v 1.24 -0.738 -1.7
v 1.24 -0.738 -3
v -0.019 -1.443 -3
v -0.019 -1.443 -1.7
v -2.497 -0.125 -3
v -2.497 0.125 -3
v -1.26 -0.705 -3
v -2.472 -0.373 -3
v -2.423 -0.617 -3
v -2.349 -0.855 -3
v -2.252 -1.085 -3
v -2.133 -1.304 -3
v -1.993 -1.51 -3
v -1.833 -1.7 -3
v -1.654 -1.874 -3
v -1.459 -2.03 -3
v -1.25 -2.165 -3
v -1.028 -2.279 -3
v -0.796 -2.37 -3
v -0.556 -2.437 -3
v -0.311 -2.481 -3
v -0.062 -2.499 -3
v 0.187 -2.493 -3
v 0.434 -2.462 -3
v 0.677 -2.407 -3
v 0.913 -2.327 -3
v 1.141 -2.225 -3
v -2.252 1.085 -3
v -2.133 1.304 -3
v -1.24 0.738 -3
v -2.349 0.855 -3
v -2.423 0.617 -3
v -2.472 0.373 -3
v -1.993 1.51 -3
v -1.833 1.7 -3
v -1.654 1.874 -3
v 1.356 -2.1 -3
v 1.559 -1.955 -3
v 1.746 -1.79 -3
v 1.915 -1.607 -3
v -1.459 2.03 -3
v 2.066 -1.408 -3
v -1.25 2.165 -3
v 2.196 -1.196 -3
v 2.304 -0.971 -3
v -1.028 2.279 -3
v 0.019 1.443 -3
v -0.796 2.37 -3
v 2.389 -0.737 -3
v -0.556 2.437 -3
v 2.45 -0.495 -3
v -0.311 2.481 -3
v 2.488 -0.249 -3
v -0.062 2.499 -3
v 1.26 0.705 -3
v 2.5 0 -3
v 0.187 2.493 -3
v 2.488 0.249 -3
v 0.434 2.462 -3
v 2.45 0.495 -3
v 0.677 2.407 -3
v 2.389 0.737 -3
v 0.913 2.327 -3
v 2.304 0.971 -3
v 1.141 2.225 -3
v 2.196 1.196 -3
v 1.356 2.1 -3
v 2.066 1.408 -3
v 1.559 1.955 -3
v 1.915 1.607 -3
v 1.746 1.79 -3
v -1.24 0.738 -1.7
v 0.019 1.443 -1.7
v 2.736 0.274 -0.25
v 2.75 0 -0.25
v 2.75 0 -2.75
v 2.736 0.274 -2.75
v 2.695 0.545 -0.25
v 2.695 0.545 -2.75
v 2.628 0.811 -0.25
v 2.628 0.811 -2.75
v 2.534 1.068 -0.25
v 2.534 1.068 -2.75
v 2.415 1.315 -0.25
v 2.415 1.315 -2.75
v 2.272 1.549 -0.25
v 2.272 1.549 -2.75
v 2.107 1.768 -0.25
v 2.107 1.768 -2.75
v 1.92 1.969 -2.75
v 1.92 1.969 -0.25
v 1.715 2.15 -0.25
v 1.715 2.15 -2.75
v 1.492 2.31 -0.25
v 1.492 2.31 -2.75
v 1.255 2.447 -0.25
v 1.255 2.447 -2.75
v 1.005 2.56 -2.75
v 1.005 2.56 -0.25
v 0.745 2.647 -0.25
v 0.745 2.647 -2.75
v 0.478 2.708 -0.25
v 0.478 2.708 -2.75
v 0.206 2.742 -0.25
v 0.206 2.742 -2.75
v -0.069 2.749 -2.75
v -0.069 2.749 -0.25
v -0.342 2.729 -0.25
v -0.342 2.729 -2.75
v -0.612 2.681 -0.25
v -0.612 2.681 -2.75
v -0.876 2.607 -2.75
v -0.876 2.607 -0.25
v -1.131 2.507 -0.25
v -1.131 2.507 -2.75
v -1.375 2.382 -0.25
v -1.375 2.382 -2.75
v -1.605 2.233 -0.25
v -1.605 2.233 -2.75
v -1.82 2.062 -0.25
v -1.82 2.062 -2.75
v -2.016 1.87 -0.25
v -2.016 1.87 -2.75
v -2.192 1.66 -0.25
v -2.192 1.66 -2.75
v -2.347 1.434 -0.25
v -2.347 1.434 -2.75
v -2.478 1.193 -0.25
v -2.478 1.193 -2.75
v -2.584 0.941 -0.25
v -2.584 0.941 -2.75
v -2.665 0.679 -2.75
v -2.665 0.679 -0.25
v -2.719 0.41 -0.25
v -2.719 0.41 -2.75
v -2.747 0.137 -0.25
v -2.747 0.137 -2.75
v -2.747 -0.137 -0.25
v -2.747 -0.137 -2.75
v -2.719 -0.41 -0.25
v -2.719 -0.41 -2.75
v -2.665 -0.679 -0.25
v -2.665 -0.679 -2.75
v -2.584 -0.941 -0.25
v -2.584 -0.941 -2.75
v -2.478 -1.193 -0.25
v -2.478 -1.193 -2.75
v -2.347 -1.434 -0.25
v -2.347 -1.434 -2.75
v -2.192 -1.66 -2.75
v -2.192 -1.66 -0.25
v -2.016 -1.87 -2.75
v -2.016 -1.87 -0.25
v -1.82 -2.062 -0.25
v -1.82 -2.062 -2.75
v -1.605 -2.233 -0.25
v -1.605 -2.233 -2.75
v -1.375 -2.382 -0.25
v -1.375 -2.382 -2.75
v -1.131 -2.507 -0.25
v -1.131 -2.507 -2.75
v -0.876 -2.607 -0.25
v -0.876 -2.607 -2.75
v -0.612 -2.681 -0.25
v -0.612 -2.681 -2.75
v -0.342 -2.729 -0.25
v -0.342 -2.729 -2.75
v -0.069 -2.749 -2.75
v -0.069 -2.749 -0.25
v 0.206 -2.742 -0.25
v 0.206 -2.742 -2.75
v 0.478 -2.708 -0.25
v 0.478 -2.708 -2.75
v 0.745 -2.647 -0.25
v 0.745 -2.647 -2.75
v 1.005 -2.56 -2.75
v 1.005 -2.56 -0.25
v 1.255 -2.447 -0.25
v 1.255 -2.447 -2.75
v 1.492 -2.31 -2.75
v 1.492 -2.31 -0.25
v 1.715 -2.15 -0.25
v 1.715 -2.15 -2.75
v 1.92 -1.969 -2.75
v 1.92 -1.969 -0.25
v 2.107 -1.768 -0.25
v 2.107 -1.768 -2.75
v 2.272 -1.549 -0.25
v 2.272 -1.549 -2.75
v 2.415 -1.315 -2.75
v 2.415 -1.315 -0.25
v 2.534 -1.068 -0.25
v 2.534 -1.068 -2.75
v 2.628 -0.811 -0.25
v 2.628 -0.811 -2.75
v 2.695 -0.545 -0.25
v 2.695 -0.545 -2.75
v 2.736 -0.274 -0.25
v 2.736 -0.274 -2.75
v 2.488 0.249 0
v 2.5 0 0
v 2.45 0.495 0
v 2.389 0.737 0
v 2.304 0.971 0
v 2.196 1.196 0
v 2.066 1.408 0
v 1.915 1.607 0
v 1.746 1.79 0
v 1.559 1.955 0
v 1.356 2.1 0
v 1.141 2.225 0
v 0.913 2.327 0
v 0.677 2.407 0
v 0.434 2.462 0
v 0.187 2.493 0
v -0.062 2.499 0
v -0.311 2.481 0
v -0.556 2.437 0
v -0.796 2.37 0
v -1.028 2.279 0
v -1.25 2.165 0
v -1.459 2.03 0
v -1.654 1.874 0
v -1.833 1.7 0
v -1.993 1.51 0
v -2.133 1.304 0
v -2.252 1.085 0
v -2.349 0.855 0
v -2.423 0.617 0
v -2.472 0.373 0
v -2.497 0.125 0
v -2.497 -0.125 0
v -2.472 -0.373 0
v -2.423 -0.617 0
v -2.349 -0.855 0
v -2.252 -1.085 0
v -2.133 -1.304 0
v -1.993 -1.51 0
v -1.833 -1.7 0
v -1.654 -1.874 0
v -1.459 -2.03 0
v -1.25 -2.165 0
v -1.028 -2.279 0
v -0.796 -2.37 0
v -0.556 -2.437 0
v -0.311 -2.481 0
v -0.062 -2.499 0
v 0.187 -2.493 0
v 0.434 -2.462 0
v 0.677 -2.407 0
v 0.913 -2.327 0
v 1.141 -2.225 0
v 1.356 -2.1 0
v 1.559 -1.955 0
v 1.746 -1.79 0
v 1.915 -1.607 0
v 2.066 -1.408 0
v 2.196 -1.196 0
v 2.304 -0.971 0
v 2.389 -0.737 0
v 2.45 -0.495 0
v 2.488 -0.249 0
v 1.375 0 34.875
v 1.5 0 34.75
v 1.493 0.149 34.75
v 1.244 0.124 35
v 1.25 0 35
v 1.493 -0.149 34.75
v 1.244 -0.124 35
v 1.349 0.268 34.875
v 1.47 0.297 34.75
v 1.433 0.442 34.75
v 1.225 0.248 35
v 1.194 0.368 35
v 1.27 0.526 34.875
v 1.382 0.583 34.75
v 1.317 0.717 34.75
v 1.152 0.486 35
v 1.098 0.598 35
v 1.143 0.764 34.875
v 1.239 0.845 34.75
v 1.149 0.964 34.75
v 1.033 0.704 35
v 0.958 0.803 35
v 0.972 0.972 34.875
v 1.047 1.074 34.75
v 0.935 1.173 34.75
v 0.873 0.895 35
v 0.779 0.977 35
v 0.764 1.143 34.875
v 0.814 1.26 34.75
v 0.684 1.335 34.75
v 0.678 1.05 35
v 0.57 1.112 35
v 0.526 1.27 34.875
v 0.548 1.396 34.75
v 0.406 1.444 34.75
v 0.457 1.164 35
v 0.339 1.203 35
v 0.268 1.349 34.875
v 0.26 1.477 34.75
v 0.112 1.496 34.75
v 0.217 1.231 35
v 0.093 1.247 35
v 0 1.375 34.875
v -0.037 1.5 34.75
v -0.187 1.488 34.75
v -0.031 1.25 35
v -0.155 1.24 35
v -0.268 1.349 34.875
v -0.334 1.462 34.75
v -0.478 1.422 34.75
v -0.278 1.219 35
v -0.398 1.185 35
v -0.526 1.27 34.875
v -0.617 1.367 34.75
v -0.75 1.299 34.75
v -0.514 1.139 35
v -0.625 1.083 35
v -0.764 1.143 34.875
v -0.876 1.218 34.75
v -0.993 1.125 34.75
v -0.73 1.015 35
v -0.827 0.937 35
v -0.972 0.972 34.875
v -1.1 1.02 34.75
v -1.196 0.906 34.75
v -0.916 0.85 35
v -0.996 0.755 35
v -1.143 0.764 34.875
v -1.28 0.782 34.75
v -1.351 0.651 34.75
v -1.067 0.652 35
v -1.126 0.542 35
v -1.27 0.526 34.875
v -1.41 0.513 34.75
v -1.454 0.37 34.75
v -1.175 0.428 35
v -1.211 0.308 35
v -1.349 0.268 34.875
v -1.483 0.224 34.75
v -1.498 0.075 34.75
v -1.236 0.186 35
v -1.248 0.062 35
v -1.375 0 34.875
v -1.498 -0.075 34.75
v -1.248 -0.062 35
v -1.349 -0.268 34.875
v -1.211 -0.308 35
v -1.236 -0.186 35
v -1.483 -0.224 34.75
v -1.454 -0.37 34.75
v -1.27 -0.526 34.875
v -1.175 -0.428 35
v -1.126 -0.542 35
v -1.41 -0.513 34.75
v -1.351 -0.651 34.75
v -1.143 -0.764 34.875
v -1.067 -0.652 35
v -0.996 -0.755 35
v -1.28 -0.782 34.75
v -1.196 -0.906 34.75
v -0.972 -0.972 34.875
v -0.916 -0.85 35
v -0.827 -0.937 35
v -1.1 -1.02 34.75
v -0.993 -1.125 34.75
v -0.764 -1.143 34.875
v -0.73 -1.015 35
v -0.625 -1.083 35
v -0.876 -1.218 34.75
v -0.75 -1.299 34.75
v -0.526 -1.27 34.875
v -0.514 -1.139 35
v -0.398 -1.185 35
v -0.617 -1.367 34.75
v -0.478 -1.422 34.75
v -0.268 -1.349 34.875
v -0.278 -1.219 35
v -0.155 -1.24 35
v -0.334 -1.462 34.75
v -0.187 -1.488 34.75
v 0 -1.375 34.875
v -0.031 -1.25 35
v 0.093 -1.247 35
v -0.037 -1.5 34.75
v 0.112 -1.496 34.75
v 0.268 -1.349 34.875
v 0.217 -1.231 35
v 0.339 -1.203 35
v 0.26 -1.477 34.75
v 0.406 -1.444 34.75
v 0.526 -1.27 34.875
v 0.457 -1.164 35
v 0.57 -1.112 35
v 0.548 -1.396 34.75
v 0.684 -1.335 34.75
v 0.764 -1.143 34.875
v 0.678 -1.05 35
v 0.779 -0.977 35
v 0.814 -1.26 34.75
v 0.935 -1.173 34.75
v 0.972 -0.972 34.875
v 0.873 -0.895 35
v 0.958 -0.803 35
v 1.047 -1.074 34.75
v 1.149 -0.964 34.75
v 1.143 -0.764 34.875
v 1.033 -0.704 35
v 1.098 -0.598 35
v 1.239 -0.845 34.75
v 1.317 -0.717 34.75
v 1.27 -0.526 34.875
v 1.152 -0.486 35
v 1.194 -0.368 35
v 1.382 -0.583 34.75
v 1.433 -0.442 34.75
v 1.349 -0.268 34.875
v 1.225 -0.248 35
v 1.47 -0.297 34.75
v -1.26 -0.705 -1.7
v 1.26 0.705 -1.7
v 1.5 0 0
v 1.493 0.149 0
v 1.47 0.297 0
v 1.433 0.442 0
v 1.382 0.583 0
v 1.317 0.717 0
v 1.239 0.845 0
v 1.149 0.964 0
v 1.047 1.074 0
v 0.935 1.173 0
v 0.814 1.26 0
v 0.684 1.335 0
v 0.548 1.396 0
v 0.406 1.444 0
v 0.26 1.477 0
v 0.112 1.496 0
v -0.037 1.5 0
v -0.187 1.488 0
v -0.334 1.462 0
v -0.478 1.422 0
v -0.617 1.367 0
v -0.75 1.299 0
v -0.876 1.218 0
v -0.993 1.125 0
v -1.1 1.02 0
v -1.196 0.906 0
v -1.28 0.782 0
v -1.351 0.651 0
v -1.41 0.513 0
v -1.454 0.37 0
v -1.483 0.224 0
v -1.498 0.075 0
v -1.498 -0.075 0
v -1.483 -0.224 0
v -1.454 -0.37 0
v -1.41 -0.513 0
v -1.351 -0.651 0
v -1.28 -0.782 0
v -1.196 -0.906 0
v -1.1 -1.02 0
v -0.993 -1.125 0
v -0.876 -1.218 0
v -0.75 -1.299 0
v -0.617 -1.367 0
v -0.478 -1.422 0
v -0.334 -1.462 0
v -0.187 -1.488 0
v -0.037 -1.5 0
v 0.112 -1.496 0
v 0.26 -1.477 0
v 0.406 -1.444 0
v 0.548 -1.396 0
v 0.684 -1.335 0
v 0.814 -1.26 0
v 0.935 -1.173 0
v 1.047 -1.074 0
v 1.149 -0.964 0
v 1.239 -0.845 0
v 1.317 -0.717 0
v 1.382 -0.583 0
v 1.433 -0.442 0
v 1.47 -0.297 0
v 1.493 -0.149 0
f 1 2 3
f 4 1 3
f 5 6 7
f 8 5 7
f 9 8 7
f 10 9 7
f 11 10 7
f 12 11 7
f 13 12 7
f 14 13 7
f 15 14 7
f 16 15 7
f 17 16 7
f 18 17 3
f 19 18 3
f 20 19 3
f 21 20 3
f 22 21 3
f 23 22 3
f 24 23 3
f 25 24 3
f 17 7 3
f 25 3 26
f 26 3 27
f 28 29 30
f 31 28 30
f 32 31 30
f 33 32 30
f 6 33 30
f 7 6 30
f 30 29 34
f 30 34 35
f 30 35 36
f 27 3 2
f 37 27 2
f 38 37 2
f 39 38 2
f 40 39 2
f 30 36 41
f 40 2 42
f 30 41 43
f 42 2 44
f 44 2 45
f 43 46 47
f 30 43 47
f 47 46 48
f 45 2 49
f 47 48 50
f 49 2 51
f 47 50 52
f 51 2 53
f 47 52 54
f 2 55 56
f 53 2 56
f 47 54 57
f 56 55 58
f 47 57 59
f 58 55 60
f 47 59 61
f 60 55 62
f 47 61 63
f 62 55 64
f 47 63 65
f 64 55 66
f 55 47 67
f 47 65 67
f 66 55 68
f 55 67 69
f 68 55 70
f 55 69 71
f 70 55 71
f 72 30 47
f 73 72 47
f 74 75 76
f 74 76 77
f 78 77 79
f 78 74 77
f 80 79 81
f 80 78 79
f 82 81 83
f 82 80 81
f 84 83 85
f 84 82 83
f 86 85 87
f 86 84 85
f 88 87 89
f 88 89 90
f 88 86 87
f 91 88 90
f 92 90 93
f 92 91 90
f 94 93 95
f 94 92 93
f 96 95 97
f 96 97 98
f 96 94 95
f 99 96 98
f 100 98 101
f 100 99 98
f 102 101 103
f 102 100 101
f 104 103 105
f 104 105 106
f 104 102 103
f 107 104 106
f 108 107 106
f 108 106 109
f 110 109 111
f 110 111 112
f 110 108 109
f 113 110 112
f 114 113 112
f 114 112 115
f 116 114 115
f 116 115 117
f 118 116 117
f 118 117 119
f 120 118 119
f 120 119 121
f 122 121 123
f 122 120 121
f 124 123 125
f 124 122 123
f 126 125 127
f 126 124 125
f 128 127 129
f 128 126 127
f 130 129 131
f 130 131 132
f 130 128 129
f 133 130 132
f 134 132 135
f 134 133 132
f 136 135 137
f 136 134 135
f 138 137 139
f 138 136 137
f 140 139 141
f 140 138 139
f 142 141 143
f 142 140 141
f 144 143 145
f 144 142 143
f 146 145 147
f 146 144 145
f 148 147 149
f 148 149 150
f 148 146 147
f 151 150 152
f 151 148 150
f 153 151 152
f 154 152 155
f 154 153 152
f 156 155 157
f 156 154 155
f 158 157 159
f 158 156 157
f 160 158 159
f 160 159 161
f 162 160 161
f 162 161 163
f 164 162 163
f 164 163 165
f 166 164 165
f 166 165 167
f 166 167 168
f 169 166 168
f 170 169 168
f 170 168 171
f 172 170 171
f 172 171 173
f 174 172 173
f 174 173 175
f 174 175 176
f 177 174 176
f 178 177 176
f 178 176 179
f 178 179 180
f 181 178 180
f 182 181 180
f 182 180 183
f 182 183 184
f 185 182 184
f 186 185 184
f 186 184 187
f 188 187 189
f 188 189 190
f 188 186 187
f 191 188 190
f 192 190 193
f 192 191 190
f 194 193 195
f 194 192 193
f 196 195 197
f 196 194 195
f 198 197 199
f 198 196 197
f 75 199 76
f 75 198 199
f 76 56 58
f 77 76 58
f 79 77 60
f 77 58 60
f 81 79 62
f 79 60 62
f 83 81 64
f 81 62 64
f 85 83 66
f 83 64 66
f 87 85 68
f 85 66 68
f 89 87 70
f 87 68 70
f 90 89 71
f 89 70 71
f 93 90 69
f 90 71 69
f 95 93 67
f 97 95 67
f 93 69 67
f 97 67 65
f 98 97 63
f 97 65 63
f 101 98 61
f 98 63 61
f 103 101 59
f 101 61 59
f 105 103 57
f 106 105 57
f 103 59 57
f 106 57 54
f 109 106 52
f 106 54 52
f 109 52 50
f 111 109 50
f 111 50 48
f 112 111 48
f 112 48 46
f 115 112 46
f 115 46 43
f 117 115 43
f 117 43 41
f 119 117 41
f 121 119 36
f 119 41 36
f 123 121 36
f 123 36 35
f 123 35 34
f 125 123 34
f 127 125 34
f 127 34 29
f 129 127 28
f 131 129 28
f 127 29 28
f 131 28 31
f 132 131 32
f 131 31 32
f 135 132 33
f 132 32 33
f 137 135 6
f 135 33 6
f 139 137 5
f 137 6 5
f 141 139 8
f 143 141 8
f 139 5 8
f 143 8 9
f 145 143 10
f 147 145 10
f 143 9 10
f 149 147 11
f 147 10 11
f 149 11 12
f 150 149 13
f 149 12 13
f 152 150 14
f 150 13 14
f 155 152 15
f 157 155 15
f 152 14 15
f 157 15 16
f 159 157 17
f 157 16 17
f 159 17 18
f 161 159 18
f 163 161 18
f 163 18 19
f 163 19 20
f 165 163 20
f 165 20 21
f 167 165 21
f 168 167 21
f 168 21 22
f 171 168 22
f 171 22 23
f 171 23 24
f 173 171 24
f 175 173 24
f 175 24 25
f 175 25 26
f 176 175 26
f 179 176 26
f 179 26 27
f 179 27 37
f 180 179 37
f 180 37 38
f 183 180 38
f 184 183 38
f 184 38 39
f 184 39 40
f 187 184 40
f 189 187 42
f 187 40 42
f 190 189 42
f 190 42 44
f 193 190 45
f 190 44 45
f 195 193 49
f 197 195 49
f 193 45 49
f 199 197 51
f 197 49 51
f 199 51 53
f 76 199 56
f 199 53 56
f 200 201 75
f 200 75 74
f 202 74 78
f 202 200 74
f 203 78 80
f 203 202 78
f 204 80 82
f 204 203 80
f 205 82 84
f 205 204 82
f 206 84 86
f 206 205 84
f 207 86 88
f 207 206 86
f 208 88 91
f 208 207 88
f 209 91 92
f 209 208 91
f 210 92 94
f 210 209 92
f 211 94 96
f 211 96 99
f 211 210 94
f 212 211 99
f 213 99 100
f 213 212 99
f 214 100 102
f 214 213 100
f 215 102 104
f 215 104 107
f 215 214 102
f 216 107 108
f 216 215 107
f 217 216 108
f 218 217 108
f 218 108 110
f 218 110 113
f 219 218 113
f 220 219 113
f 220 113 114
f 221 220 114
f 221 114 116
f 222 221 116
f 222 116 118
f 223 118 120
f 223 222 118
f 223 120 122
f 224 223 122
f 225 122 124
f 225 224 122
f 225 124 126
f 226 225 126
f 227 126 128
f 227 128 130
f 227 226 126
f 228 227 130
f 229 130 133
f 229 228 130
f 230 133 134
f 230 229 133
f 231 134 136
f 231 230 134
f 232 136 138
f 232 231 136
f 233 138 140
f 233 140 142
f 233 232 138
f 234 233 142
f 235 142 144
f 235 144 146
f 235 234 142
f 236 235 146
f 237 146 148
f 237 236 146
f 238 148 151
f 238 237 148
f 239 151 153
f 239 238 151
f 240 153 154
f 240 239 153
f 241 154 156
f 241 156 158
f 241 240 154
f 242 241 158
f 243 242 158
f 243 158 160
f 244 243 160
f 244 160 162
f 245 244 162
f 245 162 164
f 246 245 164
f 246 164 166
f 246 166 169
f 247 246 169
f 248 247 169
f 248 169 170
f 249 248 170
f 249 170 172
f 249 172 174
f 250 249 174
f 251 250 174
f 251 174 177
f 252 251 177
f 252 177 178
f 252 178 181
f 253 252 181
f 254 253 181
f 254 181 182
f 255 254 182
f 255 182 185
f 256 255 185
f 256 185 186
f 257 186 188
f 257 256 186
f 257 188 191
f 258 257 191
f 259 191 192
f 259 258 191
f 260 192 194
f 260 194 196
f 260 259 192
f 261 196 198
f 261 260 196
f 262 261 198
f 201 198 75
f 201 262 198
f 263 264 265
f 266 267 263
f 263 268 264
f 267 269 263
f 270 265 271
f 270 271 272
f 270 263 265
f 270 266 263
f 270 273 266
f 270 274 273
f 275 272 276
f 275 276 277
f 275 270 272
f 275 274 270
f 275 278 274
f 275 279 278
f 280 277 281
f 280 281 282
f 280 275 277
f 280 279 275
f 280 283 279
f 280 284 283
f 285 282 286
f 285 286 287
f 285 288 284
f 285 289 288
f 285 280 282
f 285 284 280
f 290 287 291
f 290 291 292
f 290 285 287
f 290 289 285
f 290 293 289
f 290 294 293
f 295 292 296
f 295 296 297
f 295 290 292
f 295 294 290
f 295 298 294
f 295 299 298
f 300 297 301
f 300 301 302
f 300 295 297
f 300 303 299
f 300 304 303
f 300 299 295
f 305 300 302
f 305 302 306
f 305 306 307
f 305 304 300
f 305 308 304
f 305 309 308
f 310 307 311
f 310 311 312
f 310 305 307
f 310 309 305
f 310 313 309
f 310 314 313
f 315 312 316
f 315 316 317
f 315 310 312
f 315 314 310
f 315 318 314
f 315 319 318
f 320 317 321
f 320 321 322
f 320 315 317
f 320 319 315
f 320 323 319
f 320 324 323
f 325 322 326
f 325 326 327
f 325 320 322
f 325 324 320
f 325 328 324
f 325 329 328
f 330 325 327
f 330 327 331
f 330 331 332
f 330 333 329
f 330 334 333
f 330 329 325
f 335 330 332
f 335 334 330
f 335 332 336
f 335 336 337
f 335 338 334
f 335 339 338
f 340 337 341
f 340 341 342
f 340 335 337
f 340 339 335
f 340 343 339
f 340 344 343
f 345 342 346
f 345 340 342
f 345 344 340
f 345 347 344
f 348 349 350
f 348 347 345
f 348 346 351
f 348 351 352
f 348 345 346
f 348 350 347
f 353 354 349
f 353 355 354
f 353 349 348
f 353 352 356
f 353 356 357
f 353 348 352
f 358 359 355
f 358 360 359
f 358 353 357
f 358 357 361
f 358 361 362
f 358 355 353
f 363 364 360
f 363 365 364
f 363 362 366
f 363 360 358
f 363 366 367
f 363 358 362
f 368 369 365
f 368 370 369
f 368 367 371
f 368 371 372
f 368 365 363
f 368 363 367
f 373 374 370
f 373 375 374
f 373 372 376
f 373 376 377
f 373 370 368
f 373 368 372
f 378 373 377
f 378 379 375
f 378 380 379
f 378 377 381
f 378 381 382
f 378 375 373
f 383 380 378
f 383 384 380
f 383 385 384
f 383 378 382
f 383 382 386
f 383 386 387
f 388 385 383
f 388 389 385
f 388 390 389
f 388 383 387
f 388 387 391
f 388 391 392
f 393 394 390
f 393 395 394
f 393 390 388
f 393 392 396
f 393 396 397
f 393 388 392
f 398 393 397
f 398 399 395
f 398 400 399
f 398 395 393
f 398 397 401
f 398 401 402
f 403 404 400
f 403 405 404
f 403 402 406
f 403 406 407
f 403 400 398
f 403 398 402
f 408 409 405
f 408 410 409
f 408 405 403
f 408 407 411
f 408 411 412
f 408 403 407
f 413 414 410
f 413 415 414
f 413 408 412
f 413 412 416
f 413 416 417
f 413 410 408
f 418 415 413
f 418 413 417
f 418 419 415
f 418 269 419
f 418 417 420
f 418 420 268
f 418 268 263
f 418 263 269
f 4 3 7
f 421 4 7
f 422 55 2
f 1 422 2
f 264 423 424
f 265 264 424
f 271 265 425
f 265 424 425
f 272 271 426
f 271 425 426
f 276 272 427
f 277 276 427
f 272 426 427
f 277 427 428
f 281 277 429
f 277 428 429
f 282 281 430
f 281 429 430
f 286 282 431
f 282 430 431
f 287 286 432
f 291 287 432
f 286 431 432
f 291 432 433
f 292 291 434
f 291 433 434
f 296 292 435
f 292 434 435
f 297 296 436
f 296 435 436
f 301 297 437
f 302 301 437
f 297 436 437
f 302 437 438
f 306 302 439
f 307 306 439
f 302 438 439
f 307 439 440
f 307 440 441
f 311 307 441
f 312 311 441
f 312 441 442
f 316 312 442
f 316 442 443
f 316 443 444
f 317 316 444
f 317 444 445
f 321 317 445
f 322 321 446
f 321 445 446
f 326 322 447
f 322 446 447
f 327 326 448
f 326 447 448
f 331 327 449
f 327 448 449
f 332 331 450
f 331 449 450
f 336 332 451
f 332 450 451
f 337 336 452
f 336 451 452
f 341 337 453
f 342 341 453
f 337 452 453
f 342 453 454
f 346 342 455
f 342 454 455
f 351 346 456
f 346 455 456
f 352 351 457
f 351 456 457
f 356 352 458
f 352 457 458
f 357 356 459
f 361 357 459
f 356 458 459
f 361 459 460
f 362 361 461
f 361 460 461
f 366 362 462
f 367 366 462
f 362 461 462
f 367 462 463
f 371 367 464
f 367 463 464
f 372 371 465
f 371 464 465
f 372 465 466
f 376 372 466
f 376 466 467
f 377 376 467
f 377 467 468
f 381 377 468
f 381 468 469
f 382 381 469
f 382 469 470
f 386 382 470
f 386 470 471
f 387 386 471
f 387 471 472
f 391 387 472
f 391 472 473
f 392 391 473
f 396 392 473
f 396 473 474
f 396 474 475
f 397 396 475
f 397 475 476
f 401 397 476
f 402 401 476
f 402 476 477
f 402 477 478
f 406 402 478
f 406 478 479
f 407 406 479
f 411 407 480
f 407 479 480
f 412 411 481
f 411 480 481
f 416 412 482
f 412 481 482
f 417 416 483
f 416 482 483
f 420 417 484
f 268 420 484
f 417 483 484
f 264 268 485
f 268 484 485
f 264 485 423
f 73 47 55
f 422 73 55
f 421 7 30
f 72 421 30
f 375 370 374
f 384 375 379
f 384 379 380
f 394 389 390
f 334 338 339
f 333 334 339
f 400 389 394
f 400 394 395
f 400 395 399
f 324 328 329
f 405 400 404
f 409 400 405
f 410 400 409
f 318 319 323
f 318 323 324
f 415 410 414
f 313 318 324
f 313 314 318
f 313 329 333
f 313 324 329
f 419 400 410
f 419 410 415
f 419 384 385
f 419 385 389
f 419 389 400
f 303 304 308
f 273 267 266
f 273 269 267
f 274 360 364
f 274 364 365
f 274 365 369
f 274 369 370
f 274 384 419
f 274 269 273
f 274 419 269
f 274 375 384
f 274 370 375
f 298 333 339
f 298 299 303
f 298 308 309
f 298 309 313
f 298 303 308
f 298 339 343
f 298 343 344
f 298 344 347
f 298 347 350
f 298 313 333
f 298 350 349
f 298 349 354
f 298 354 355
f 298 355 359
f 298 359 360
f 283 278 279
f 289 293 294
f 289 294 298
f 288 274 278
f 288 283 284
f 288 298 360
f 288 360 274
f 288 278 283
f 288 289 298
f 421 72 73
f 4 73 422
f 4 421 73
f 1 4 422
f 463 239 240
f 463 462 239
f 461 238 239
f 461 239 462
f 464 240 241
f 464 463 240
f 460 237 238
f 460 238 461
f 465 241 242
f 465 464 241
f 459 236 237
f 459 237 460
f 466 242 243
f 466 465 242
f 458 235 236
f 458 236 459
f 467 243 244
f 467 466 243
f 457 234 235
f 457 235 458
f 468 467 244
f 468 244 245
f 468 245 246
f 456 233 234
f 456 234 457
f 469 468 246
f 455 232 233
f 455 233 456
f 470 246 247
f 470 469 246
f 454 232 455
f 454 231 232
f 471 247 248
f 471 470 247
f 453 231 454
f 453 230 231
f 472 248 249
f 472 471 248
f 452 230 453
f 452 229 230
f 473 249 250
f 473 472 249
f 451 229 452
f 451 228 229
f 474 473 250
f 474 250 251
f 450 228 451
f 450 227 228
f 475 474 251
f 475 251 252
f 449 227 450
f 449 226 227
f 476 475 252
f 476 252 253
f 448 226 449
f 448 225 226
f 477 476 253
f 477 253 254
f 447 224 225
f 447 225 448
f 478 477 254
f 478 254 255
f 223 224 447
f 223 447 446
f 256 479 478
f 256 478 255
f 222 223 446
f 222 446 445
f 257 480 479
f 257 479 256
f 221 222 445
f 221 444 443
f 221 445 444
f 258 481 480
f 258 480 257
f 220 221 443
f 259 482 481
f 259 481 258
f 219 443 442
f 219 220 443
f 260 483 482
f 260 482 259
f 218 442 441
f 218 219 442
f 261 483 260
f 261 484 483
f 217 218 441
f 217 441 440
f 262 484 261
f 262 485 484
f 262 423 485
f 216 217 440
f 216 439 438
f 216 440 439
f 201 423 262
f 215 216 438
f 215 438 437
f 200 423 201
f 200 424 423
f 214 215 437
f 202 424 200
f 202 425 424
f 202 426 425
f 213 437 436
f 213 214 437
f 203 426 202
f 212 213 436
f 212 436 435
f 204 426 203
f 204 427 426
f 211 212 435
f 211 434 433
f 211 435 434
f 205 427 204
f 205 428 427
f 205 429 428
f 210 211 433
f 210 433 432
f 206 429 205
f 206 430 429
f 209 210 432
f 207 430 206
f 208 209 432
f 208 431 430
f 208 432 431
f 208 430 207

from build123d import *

# Parameters (mm, degrees)
F0_R     = 1.5
F1_DEPTH = 35
F2_R     = 2.75
F3_DEPTH = 3
F5_DEPTH = 1.3
F6_SIZE  = 0.25


with BuildPart() as f1:
    # F0 (on Top) → F1 (new body)
    with BuildSketch(Plane.XY):
        Circle(F0_R)
    extrude(amount=F1_DEPTH)

    # F2 (on Top) → F3 (join)
    with BuildSketch(Plane.XY):
        Circle(F2_R)
    extrude(amount=-F3_DEPTH)

    # F4 (on face) → F5 (cut)
    with BuildSketch(Plane(origin=(0, 0, -3), x_dir=(1, 0, 0), z_dir=(0, 0, -1))):
        Polygon((0.019386, -1.443245), (1.25958, -0.704834), (1.240194, 0.738412), (-0.019386, 1.443245), (-1.25958, 0.704834), (-1.240194, -0.738412), align=None)
    extrude(amount=-F5_DEPTH, mode=Mode.SUBTRACT)

    # F6
    f6_edges = [f1.edges().sort_by_distance(p)[0] for p in [
        (-2.75, 0, -3),
        (-2.75, 0, 0),
        (-1.5, 0, 35),
    ]]
    chamfer(f6_edges, length=F6_SIZE)


solid = f1.part
